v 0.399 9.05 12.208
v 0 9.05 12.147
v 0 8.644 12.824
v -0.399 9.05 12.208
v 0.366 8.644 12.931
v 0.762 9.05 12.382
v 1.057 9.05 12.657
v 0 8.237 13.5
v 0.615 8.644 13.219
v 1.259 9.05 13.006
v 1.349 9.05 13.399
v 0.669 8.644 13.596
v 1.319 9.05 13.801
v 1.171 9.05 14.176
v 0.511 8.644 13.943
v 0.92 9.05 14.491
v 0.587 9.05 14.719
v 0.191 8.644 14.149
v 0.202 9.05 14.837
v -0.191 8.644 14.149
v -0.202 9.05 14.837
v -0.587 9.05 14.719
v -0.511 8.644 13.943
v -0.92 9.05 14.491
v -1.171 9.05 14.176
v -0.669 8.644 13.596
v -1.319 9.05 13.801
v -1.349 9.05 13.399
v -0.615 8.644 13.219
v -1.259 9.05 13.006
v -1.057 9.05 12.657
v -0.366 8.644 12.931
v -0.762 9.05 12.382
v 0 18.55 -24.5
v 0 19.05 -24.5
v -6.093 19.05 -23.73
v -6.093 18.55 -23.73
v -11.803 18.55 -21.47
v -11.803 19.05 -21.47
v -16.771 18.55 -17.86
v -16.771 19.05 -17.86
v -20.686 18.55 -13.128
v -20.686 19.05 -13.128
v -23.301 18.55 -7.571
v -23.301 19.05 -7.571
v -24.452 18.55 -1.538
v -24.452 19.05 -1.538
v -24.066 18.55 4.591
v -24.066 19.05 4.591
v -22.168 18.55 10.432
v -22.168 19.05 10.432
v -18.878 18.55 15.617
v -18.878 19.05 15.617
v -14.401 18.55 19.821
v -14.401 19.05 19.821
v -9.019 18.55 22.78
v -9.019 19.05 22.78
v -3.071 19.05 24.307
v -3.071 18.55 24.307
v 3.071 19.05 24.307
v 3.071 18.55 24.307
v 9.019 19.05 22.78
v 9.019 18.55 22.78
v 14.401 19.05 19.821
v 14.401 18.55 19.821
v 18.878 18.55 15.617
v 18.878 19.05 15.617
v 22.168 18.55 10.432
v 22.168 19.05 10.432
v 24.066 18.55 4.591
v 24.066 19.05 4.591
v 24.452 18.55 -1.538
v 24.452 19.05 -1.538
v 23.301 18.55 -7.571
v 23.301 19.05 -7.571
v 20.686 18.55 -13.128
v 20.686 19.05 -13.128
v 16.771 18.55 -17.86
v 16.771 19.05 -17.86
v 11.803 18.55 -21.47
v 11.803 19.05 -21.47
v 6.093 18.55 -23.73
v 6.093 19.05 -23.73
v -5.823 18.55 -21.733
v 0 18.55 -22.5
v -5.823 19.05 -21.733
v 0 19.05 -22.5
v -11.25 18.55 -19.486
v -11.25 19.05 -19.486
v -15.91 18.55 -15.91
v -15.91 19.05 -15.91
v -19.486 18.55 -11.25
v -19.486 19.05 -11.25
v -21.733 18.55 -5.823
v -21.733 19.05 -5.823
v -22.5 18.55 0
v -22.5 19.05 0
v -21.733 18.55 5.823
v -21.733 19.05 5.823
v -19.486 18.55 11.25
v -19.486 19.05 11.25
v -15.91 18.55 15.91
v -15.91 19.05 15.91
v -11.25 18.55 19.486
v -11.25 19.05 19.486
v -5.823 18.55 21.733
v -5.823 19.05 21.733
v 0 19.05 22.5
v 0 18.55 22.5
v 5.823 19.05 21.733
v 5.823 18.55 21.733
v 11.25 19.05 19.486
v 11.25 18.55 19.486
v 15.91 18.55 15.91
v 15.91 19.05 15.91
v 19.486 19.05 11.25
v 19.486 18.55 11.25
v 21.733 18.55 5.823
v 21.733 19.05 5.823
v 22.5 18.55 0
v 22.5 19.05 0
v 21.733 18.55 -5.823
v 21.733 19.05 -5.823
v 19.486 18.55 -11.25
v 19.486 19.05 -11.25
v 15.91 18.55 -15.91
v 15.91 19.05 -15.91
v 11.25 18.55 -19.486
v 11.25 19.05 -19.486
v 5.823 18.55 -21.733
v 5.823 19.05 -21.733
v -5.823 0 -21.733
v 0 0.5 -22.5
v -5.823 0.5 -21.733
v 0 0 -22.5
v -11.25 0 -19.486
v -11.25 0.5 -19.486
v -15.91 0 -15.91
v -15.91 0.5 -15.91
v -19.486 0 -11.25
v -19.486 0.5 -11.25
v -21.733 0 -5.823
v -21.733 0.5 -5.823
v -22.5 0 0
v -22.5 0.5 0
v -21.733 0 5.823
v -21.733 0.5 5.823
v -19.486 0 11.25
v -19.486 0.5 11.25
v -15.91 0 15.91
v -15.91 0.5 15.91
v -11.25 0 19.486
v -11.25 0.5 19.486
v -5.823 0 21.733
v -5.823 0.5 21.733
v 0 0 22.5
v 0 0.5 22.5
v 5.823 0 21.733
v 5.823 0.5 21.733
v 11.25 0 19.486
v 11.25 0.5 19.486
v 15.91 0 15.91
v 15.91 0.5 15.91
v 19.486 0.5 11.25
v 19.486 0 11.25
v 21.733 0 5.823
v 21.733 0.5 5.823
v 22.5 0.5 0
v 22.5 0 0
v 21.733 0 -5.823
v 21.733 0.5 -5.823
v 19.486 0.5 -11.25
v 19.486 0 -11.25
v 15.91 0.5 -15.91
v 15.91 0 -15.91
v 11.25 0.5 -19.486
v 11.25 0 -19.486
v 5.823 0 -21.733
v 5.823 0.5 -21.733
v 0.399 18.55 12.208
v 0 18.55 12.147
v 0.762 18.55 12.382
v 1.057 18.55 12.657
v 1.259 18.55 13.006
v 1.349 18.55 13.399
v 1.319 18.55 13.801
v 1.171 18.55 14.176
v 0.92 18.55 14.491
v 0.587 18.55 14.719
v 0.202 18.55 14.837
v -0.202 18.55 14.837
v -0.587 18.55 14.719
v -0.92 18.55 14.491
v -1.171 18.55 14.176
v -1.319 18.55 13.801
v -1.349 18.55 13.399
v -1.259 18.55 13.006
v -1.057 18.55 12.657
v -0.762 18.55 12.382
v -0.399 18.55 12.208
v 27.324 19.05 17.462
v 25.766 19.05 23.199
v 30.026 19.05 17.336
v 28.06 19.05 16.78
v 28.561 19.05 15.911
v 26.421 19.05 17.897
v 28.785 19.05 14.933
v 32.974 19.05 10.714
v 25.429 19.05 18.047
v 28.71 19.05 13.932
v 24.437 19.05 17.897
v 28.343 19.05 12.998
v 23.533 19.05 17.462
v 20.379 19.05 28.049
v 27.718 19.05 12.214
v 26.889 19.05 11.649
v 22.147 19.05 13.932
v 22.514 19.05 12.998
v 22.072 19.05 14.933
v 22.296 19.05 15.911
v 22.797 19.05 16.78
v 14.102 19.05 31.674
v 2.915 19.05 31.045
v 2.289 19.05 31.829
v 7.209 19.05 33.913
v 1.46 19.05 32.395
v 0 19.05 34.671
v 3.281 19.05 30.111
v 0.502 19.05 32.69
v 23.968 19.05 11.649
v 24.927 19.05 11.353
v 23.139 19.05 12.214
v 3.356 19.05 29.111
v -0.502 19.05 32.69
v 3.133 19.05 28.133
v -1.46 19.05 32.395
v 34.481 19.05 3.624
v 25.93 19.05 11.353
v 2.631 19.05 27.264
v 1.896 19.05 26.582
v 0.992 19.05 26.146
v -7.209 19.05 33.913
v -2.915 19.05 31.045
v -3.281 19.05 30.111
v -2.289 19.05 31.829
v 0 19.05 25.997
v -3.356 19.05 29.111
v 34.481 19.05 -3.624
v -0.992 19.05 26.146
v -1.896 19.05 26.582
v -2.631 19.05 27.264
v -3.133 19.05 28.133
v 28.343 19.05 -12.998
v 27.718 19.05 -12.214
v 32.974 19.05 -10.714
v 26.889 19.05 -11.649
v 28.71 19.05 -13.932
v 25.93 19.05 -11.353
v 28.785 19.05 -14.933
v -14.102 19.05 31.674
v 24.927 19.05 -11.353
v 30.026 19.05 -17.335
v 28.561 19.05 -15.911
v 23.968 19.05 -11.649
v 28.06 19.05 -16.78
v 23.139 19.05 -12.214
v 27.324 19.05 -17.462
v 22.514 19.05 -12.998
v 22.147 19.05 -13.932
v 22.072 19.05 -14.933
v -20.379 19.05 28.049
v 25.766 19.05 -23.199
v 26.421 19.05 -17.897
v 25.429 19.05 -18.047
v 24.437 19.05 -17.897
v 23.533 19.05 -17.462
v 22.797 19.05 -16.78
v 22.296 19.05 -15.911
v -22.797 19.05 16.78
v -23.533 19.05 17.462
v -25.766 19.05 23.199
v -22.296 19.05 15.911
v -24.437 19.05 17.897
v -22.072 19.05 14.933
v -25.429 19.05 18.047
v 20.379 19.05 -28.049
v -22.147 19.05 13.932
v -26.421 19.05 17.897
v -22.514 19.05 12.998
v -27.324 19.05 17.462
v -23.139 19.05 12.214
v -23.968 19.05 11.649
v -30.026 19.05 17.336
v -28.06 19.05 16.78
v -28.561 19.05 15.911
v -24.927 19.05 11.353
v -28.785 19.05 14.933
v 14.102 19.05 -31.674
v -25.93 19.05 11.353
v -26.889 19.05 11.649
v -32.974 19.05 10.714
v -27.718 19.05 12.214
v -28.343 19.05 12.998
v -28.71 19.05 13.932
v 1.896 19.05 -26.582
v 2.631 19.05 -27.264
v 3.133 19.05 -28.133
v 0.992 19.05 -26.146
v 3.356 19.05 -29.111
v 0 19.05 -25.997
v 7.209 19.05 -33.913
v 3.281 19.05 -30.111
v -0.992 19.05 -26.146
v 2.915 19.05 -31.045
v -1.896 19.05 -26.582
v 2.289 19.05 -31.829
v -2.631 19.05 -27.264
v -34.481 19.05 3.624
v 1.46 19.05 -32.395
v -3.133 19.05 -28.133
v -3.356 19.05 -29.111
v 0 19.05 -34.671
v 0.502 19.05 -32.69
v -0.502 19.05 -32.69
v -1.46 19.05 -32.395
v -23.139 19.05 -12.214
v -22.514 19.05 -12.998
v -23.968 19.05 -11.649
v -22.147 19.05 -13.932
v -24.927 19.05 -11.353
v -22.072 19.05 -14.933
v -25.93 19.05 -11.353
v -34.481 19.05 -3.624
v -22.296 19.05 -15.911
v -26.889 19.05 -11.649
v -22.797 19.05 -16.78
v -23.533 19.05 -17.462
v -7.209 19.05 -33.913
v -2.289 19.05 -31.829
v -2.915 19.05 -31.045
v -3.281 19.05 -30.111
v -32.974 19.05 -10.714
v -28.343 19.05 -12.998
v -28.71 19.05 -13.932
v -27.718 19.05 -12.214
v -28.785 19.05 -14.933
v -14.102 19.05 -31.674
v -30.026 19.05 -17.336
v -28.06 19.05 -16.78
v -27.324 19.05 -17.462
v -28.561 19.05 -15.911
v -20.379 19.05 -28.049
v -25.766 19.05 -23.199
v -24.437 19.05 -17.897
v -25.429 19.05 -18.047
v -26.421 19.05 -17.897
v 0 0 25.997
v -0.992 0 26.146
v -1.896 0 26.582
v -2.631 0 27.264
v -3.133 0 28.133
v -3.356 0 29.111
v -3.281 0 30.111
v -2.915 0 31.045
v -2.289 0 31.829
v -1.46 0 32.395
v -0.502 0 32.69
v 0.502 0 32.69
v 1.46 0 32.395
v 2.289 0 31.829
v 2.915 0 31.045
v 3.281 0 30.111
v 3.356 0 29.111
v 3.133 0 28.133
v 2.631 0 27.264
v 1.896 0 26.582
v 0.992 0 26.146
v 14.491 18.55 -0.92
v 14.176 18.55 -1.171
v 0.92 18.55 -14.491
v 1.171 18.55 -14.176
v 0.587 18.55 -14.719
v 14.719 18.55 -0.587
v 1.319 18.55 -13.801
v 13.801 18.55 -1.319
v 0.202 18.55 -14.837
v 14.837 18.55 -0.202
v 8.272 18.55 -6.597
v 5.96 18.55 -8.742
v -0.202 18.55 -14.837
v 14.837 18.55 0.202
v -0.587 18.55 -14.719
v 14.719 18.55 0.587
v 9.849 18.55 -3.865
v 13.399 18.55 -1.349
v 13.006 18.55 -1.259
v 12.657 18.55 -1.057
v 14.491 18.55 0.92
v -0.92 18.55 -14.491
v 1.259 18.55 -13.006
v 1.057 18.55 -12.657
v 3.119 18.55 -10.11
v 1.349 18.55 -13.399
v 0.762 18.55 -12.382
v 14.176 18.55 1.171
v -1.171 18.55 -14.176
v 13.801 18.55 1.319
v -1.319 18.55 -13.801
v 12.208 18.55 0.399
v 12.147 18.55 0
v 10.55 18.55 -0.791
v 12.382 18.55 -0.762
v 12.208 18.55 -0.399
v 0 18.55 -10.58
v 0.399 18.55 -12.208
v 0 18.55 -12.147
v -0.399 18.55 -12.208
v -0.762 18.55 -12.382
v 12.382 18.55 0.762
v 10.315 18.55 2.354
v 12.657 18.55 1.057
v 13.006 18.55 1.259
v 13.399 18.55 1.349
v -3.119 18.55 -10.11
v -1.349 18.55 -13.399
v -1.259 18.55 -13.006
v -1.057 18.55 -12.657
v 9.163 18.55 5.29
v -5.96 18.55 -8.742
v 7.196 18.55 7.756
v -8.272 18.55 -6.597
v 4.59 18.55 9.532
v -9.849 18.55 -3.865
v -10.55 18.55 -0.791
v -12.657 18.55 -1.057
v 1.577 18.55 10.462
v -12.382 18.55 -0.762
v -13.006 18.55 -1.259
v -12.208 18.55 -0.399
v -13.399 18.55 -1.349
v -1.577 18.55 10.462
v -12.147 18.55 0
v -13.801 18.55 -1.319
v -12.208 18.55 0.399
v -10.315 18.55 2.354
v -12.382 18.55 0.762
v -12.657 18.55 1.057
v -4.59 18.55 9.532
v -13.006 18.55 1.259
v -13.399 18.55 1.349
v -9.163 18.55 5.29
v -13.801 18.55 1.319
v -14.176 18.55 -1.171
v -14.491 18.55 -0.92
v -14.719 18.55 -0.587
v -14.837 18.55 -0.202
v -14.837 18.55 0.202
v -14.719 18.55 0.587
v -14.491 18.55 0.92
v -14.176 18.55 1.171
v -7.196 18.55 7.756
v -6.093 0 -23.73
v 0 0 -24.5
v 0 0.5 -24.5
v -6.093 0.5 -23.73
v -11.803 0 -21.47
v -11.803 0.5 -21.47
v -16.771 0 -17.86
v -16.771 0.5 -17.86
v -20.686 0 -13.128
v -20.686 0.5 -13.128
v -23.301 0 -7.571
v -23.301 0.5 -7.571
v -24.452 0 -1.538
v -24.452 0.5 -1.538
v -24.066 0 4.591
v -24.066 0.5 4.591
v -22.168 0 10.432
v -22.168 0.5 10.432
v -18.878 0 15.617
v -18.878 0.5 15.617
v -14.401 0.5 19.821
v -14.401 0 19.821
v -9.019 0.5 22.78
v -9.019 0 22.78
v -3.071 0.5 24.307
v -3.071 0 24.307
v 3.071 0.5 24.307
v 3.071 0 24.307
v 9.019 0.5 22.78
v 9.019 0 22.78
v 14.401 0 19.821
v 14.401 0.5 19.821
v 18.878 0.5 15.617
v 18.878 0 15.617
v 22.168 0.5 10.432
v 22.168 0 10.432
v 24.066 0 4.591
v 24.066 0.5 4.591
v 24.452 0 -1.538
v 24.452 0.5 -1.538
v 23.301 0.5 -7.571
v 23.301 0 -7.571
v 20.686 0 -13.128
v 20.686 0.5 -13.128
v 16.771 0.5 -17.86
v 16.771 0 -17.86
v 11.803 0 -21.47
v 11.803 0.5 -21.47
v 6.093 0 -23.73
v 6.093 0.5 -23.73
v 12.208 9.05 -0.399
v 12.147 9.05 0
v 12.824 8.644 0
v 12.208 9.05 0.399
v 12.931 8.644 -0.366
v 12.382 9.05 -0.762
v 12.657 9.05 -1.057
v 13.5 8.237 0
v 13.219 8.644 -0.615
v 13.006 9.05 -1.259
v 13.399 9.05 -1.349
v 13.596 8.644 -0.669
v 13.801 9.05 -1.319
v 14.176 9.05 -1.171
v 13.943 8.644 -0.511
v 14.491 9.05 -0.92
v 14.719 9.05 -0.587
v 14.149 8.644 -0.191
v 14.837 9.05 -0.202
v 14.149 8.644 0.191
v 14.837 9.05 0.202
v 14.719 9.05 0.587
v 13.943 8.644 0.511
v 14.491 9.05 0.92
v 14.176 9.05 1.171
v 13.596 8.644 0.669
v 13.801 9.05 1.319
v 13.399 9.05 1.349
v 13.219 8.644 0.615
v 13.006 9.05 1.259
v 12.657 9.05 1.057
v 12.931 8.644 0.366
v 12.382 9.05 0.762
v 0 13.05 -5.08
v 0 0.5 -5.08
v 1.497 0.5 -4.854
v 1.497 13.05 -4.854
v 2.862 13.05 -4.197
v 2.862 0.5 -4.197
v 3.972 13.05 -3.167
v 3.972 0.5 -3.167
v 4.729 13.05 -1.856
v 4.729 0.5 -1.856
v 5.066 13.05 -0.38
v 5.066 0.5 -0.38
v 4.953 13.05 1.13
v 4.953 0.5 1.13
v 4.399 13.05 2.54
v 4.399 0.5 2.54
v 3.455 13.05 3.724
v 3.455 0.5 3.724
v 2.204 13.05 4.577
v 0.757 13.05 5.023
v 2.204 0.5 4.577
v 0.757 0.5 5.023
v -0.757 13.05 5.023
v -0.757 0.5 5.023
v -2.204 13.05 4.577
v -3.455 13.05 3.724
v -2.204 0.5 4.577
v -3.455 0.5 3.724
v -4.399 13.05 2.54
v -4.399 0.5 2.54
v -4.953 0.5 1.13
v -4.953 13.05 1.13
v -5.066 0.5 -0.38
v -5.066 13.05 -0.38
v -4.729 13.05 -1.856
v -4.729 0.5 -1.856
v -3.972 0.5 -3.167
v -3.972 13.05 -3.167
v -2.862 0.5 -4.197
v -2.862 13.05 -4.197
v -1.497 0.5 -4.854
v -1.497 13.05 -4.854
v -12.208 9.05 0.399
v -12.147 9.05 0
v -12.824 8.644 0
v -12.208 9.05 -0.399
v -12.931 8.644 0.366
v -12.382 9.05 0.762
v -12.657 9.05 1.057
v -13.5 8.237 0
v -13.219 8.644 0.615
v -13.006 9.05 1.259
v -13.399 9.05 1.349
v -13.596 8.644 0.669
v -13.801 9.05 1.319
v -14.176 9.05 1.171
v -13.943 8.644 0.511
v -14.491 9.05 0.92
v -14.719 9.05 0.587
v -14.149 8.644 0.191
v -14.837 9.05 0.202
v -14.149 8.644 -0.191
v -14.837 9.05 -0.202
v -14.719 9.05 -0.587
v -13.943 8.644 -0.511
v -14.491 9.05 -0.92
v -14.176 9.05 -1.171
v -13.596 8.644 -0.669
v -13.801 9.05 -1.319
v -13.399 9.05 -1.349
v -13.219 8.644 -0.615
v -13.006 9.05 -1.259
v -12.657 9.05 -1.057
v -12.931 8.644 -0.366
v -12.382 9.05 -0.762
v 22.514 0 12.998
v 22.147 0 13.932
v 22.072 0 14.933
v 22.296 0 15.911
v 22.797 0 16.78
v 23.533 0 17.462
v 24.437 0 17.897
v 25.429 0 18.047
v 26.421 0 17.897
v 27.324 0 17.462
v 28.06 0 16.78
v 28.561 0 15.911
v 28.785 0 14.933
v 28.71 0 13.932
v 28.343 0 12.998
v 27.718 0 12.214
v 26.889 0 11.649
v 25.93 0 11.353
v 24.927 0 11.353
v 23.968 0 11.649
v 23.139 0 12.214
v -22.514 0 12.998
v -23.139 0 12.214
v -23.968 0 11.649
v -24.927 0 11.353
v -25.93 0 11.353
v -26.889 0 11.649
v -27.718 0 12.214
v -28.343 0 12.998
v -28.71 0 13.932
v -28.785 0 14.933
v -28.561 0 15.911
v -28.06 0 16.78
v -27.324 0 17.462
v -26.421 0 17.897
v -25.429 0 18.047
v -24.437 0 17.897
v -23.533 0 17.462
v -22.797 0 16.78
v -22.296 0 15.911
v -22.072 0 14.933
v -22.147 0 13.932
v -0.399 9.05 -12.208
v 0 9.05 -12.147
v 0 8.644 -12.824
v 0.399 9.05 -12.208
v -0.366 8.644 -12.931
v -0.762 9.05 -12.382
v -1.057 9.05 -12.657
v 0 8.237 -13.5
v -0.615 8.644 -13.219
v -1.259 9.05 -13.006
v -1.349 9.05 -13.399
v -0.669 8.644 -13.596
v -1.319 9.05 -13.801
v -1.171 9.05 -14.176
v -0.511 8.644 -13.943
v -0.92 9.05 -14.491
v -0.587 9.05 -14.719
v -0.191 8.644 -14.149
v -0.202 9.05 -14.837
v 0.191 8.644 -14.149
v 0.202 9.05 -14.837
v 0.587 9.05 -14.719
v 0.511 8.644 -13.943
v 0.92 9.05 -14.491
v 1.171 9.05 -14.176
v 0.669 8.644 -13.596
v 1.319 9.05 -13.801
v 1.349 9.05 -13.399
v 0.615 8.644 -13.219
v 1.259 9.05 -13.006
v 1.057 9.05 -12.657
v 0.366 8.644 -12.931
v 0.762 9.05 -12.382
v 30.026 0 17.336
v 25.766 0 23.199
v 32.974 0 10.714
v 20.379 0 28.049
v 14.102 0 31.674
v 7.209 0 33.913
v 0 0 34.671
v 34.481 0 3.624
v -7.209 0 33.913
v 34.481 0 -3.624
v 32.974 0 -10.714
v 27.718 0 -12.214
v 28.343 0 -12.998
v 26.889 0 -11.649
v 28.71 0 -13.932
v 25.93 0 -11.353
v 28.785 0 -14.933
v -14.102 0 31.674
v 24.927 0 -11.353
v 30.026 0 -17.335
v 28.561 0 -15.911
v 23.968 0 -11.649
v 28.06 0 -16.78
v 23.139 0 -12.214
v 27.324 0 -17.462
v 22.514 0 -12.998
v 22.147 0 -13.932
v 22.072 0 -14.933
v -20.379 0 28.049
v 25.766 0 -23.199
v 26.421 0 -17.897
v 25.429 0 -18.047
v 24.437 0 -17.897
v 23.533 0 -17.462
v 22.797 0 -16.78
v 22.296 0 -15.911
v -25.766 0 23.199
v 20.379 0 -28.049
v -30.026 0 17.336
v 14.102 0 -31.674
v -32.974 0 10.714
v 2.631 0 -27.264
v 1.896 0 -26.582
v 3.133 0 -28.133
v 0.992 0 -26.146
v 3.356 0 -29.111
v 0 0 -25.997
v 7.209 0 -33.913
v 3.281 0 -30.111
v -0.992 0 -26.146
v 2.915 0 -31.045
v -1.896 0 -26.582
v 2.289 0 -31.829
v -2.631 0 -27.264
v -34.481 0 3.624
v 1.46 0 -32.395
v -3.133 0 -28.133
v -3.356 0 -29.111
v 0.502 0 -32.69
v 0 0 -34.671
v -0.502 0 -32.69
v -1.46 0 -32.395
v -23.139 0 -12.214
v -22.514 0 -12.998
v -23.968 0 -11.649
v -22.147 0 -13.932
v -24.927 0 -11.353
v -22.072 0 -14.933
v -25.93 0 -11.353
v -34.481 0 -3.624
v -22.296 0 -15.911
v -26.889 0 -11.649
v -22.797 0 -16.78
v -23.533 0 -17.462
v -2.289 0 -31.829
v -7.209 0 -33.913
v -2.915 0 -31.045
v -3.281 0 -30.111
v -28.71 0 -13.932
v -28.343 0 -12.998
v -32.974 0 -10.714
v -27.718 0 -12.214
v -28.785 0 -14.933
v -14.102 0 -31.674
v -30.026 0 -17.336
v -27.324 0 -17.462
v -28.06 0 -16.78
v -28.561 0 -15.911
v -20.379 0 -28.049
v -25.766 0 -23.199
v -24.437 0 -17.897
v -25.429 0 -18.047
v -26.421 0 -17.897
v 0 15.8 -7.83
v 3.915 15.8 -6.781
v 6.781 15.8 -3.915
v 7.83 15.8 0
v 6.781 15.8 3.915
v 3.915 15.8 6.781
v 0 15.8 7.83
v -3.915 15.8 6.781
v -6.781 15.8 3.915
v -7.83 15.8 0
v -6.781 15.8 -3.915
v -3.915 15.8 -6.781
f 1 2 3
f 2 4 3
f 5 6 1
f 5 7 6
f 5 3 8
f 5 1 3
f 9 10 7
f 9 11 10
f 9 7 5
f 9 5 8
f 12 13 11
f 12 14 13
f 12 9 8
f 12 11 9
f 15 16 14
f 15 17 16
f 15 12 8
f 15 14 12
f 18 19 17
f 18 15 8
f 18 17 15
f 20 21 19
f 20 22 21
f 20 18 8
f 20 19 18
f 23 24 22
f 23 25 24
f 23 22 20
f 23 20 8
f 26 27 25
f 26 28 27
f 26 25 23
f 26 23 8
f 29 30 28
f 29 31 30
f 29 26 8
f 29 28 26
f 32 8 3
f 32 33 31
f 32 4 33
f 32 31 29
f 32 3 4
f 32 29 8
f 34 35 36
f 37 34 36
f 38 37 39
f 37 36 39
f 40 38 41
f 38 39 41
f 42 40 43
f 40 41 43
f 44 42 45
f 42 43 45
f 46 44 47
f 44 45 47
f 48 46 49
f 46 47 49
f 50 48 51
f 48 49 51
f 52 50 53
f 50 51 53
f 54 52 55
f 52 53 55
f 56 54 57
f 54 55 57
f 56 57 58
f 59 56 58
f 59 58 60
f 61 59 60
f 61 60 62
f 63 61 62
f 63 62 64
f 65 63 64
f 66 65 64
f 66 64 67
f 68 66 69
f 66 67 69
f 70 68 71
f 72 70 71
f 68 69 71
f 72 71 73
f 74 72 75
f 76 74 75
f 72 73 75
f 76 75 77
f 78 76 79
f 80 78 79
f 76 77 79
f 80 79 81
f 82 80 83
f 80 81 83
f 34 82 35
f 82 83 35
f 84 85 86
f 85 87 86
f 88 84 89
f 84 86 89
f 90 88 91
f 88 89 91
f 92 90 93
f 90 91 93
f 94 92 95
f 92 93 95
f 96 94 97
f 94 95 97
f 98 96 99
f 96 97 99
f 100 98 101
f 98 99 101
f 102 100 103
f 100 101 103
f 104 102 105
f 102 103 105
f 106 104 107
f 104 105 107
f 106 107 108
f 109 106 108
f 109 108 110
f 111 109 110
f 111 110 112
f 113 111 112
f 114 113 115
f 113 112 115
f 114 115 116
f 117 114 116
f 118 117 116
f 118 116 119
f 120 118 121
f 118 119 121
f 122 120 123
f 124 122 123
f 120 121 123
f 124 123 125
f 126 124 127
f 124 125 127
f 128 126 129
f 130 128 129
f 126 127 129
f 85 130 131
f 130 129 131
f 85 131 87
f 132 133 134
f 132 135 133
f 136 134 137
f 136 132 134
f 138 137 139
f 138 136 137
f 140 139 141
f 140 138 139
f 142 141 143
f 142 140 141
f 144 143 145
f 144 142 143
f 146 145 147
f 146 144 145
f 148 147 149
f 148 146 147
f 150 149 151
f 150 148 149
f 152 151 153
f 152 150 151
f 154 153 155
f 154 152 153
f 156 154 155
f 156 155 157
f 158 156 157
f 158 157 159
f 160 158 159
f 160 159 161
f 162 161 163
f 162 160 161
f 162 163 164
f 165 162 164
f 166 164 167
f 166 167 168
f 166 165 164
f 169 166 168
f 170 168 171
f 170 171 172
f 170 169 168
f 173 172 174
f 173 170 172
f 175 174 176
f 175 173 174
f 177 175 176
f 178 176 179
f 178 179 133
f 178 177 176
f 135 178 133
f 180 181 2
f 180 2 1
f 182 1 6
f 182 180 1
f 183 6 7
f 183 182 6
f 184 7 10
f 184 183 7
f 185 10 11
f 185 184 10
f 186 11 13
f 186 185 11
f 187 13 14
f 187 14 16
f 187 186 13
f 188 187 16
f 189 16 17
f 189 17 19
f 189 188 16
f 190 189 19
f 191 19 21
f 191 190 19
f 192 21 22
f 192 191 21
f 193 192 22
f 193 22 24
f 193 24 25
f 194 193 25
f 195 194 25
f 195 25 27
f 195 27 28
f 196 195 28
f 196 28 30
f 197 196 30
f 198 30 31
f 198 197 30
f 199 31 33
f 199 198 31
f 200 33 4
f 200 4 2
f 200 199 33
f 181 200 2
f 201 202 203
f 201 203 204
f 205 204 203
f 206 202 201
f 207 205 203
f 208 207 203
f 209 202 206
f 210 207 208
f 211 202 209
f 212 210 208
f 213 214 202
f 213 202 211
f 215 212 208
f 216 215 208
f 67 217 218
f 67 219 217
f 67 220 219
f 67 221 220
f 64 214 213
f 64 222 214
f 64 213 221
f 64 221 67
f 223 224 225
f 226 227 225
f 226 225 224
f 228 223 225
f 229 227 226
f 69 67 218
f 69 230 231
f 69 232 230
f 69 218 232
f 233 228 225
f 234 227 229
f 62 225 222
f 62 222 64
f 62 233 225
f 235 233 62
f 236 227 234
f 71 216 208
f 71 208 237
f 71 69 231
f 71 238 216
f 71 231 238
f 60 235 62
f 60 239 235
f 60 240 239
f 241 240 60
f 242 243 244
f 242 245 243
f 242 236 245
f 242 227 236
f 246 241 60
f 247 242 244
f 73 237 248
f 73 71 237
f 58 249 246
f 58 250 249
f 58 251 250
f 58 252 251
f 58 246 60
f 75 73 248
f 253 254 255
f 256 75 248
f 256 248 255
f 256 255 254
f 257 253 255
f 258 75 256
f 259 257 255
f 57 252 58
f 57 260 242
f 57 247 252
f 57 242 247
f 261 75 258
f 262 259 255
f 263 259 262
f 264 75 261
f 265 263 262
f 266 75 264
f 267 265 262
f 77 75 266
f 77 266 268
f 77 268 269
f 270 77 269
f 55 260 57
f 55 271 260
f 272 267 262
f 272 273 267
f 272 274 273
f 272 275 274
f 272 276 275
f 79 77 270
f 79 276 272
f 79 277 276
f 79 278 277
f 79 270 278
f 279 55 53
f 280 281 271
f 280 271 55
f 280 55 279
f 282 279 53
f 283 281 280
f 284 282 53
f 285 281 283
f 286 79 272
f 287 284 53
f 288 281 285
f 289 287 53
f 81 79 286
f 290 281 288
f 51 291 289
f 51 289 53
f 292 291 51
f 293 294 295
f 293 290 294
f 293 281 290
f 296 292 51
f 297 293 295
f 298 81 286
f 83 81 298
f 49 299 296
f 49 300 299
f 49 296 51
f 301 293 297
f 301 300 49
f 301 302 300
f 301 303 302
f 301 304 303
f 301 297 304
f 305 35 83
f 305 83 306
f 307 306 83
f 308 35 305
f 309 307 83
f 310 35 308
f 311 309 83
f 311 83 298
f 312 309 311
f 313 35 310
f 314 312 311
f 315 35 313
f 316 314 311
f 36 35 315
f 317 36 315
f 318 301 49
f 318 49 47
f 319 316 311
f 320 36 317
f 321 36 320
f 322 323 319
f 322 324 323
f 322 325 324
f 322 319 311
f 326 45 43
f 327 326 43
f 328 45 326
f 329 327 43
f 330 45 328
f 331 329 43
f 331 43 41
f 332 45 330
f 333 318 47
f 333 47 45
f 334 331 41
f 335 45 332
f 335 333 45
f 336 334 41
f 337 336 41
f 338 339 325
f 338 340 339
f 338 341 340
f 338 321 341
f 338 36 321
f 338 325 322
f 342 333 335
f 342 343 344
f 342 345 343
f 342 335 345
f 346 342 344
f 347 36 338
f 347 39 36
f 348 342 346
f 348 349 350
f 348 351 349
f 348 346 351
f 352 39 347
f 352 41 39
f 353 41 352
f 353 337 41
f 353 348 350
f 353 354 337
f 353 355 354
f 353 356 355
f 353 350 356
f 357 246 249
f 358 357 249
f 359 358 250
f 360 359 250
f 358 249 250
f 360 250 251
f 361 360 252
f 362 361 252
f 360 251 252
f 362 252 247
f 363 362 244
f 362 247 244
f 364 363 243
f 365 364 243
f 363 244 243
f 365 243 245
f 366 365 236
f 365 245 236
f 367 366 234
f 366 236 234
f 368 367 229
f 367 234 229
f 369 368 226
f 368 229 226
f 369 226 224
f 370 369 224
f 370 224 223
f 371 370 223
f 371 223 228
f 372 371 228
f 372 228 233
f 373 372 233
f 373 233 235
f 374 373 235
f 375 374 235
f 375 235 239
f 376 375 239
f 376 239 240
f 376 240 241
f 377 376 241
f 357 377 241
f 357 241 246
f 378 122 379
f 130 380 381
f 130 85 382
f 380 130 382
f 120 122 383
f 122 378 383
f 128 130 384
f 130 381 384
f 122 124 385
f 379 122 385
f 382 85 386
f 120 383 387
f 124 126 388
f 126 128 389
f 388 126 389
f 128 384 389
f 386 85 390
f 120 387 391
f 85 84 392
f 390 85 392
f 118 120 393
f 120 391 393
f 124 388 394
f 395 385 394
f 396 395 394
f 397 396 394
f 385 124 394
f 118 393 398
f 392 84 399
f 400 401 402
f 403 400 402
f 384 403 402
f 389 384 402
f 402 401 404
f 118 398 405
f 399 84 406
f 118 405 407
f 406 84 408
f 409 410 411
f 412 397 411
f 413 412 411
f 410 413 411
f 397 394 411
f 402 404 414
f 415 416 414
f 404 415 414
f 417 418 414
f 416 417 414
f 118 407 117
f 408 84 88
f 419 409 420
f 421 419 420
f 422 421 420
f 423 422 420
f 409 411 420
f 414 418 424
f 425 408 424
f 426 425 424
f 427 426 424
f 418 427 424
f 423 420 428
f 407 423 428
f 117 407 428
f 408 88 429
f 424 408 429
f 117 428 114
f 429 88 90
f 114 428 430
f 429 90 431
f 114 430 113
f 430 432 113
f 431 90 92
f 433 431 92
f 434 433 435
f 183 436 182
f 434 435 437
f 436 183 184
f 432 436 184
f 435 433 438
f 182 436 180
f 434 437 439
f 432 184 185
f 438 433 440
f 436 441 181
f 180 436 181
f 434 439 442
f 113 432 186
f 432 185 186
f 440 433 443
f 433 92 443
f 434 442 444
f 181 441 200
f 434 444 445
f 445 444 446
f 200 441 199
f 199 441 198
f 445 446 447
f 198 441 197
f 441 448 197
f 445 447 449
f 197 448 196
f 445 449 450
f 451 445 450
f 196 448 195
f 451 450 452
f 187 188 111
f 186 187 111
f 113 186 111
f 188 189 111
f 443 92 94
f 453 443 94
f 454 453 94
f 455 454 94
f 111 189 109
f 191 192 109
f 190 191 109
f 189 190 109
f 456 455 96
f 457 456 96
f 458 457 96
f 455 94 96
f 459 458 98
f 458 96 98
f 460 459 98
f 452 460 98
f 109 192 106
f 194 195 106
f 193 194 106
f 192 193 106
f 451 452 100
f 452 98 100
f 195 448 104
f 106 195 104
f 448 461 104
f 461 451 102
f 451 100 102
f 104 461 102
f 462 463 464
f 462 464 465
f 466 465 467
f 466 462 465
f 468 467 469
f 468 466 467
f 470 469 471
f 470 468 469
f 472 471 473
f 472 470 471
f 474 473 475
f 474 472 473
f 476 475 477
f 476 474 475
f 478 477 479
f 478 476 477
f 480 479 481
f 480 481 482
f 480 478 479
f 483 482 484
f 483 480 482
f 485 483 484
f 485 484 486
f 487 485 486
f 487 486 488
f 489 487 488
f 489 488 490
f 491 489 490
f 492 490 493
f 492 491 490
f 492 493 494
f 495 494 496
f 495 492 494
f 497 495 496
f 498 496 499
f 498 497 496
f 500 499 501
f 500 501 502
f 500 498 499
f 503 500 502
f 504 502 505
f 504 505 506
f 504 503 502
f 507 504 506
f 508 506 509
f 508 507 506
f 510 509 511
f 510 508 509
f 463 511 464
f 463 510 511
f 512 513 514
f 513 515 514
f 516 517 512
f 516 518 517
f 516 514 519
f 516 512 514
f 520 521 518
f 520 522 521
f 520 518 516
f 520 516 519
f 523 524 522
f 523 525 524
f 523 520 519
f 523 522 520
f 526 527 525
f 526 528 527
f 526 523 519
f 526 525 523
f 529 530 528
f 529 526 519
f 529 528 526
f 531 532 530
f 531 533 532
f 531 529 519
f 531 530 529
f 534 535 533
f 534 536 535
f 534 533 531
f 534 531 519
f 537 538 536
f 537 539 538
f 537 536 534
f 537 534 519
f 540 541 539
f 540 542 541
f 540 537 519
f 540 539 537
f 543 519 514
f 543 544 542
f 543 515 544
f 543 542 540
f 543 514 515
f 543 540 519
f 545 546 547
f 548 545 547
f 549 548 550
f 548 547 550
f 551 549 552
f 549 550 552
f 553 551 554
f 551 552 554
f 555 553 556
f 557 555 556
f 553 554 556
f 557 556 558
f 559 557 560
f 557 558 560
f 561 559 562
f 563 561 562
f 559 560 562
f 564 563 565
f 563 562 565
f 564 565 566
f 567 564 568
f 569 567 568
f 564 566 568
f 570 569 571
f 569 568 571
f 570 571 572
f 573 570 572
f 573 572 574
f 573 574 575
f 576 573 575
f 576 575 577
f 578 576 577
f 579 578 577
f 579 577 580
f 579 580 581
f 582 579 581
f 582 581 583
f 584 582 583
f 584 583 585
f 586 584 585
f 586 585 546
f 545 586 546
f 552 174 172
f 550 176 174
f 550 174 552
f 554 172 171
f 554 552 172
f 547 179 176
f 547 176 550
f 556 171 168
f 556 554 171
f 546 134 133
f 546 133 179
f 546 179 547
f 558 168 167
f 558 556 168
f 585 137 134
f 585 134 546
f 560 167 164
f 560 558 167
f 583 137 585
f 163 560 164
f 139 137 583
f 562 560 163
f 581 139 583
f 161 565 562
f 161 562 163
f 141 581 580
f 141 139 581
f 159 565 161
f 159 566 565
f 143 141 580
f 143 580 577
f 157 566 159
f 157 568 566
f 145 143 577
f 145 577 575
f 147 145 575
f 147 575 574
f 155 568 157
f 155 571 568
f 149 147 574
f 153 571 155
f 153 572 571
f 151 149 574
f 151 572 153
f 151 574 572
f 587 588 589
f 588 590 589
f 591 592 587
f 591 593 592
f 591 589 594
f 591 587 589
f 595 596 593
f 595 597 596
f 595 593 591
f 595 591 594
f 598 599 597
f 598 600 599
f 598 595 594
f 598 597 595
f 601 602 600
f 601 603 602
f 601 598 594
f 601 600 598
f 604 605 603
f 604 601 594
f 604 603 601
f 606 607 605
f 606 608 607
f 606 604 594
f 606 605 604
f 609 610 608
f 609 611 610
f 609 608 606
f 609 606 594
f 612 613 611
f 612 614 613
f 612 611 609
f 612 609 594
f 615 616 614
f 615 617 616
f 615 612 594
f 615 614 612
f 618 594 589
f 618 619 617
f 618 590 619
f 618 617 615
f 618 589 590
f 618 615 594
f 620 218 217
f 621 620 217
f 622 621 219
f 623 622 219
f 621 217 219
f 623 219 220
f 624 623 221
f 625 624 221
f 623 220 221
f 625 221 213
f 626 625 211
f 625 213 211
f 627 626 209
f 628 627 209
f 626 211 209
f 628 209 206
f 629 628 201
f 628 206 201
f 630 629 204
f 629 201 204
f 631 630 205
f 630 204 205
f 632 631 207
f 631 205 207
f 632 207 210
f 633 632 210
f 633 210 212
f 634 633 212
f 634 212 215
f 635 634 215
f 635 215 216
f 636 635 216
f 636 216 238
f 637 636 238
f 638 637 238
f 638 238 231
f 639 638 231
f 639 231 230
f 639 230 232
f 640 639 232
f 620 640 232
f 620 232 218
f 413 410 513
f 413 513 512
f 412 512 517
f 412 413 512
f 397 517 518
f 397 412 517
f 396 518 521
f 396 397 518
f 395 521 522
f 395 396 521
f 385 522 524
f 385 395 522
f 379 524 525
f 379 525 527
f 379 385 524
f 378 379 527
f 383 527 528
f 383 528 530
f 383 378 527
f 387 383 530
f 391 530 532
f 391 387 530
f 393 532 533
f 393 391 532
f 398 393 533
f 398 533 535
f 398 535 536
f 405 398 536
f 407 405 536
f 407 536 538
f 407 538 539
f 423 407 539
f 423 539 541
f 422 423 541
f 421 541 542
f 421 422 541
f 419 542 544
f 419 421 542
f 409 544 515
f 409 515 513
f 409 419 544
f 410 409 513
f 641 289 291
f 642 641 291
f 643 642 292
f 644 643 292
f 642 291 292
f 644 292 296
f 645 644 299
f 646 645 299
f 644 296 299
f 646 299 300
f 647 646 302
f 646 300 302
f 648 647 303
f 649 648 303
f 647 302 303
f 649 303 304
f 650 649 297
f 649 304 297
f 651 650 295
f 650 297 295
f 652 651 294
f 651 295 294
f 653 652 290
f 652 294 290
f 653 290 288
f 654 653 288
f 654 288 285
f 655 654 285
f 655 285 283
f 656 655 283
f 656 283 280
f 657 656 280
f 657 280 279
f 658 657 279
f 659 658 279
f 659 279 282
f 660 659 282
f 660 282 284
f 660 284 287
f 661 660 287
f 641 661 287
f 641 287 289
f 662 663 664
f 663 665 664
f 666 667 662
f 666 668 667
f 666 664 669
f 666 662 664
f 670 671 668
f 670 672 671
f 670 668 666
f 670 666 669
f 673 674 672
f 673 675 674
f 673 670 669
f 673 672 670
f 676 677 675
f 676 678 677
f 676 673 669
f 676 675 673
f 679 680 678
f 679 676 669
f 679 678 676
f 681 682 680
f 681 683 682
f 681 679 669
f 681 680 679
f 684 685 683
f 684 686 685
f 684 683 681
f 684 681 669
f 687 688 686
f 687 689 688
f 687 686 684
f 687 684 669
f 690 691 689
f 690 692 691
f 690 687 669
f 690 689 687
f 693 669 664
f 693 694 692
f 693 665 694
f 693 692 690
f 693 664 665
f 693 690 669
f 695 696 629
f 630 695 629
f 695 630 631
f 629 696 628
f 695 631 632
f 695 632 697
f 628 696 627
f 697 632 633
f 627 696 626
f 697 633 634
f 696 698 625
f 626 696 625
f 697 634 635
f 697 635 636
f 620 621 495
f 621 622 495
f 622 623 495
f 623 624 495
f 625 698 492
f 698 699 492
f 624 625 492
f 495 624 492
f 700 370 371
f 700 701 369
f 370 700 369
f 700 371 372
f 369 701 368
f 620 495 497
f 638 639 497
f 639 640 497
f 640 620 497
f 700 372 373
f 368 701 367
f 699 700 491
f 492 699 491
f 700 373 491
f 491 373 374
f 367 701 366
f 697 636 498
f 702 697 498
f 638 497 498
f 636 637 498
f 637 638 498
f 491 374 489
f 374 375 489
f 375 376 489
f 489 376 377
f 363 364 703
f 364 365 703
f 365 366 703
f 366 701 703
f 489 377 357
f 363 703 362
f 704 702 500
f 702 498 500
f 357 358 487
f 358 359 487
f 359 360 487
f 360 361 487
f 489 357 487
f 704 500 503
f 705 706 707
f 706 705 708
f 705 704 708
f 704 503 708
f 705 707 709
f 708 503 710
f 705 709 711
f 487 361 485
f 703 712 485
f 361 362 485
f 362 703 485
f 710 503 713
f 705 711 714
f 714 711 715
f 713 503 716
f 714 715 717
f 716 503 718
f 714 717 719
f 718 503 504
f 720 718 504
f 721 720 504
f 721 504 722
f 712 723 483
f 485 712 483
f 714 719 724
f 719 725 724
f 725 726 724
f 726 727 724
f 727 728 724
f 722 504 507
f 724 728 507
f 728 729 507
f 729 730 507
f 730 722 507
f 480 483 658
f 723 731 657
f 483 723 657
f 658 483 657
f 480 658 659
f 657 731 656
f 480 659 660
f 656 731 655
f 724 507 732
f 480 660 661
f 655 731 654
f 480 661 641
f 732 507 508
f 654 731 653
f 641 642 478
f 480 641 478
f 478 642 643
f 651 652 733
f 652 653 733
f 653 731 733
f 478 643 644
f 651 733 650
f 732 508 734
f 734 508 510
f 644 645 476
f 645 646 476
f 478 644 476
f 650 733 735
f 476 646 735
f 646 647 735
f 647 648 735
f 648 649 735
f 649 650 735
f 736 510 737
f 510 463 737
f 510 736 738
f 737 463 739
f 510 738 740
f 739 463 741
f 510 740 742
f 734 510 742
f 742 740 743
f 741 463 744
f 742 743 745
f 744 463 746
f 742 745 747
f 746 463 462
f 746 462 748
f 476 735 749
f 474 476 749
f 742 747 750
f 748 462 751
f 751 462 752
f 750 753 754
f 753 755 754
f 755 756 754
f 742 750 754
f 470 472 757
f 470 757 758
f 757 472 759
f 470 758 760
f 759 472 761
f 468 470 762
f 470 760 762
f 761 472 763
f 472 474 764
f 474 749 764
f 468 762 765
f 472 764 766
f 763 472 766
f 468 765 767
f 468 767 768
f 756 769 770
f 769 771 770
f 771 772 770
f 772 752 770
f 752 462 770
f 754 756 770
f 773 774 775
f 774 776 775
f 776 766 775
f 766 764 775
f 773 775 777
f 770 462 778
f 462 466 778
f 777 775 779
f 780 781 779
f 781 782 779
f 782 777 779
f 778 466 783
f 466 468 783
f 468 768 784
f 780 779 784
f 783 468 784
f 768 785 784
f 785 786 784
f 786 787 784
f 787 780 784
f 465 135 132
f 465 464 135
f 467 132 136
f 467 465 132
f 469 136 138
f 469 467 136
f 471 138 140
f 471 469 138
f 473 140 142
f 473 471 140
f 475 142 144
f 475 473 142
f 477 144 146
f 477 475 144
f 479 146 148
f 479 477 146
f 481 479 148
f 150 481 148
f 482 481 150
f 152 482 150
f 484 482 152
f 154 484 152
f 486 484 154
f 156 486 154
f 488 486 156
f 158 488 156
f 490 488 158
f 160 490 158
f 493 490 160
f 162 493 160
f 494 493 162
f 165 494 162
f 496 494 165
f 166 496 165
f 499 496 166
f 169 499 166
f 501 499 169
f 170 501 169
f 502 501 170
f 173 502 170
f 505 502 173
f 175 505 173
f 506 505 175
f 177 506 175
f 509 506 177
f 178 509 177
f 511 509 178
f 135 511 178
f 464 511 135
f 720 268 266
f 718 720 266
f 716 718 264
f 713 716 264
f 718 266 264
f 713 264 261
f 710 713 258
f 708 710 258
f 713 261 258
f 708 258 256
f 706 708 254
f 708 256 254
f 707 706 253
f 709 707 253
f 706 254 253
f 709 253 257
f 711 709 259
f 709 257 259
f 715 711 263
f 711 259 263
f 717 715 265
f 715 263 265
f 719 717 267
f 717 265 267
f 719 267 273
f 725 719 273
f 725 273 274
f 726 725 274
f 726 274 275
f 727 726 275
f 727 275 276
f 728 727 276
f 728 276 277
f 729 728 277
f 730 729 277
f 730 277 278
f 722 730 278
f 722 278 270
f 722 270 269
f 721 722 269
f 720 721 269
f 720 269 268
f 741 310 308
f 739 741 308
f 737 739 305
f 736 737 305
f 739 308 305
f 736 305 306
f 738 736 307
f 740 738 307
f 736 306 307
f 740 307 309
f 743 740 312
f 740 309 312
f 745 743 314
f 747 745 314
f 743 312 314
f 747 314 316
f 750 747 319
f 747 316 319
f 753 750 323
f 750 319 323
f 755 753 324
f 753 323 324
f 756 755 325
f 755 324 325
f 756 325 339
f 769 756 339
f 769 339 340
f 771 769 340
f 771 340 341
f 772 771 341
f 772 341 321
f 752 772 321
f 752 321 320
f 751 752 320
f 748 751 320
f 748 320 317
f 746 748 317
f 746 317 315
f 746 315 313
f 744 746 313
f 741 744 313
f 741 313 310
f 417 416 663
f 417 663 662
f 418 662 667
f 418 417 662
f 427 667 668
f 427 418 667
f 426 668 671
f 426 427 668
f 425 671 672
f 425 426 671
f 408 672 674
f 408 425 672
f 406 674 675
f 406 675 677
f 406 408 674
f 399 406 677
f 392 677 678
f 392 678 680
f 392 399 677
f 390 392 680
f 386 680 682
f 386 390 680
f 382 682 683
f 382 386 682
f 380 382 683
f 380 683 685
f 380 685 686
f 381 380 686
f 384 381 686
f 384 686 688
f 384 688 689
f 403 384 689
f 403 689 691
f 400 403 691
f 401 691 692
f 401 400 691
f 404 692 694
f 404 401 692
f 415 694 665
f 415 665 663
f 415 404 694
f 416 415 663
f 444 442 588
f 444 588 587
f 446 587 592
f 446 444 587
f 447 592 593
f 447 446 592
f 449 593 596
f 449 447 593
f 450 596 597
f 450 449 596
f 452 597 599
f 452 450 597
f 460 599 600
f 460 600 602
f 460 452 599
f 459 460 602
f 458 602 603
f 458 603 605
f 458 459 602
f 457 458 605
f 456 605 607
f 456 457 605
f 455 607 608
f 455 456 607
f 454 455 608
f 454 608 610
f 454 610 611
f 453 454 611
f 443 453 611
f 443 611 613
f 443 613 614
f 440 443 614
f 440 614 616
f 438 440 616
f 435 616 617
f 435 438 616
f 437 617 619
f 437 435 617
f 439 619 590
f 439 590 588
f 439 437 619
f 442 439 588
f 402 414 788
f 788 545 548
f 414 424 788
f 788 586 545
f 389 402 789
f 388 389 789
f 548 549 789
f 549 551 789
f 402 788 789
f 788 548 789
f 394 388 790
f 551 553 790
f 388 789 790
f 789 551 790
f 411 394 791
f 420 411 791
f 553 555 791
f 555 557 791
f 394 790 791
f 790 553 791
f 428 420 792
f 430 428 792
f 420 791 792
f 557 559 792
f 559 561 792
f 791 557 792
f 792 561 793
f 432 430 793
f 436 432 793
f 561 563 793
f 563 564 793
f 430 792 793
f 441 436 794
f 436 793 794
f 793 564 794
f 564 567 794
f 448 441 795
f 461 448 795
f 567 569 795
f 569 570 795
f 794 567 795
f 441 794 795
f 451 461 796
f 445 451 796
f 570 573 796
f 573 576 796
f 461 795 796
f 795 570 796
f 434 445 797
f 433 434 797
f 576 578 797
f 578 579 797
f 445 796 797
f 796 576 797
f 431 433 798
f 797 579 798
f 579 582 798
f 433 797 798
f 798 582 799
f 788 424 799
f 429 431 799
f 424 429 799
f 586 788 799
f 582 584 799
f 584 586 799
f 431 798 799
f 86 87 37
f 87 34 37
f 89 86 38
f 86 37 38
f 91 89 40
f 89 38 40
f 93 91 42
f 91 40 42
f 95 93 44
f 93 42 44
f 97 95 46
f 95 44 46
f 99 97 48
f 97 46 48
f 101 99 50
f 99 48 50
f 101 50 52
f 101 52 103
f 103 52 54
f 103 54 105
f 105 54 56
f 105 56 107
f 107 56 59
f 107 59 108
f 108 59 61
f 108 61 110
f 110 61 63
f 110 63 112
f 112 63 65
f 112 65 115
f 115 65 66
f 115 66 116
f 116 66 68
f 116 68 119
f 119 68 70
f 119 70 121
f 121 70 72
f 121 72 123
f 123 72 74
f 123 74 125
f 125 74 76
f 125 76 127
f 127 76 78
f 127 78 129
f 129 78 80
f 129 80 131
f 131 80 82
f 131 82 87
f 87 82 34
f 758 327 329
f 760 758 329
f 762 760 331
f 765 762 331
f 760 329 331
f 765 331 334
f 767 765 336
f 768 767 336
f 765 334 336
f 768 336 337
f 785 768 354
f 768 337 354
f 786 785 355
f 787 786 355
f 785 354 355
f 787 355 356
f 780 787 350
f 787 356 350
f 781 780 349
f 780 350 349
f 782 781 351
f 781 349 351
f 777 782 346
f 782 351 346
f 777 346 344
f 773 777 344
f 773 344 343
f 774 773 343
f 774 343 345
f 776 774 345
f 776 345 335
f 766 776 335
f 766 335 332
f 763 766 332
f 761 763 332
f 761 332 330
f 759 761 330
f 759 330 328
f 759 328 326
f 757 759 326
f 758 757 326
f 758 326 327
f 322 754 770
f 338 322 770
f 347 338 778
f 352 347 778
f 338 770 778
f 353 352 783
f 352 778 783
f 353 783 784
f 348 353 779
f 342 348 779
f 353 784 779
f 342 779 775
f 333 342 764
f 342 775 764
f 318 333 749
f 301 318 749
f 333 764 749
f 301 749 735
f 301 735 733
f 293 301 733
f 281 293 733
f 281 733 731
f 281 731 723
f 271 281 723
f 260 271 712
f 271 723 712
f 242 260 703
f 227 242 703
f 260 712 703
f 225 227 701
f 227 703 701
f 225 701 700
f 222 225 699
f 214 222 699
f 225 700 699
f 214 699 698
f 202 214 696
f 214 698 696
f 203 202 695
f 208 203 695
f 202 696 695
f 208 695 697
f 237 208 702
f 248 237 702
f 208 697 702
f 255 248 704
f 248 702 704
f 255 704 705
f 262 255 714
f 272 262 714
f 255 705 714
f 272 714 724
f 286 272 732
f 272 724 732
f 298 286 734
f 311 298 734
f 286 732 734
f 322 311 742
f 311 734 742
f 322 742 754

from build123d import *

# Parameters (mm, degrees)
SKETCH1_R           = 34.671
BOSS_EXTRUDE1_DEPTH = 19.05
SKETCH5_R           = 5.08
CUT_EXTRUDE1_DEPTH  = 53.602841957
CHAMFER1_SIZE       = 6
CIRPATTERN1_COUNT   = 4
SKETCH8_R           = 3.3655
CUT_EXTRUDE2_DEPTH  = 53.602841957
CIRPATTERN2_COUNT   = 6


with BuildPart() as part:
    # Sketch1 → Boss-Extrude1 (new body)
    with BuildSketch(Plane(origin=(0, 0, 0), x_dir=(1, 0, 0), z_dir=(0, 1, 0))):
        with Locations(Location((0, 0, 0), (0, 0, 90))):
            Circle(SKETCH1_R)
    extrude(amount=BOSS_EXTRUDE1_DEPTH)

    # Sketch5 → Cut-Extrude1 (cut, through all)
    with BuildSketch(Plane.XZ):
        with Locations(Location((0, 0, 0), (0, 0, 270))):
            Circle(SKETCH5_R)
    extrude(amount=-CUT_EXTRUDE1_DEPTH, mode=Mode.SUBTRACT)

    # Chamfer1
    chamfer1_edges = [part.edges().sort_by_distance(p)[0] for p in [
        (0, 19.05, 5.08),
    ]]
    chamfer(chamfer1_edges, length=CHAMFER1_SIZE)

    # Sketch6 → #6-32 Tapped Hole1 (revolve, cut)
    with BuildSketch(Plane(origin=(0, 19.05, -13.5), x_dir=(0, 0, 1), z_dir=(1, 0, 0))):
        Polygon((0, 0), (0, 10.81269403), (1.35255, 10), (1.35255, 0), align=None)
    f_6_32_tapped_hole1 = revolve(axis=Axis((0, 25.4, -13.5), (0, -1, 0)), mode=Mode.SUBTRACT)

    # CirPattern1: #6-32 Tapped Hole1 ×4 about axis
    cirpattern1_axis = Axis((0, 0, 0), (0, 1, 0))
    for i in range(1, CIRPATTERN1_COUNT):
        add(f_6_32_tapped_hole1.rotate(cirpattern1_axis, i * 360 / CIRPATTERN1_COUNT), mode=Mode.SUBTRACT)

    # Sketch8 → Cut-Extrude2 (cut, through all)
    with BuildSketch(Plane(origin=(0, 19.05, 0), x_dir=(1, 0, 0), z_dir=(0, 1, 0))):
        with Locations(Location((0, 29.3624, 0), (0, 0, 270))):
            Circle(SKETCH8_R)
    cut_extrude2 = extrude(amount=-CUT_EXTRUDE2_DEPTH, mode=Mode.SUBTRACT)

    # CirPattern2: Cut-Extrude2 ×6 about axis
    cirpattern2_axis = Axis((0, 0, 0), (0, 1, 0))
    for i in range(1, CIRPATTERN2_COUNT):
        add(cut_extrude2.rotate(cirpattern2_axis, i * 360 / CIRPATTERN2_COUNT), mode=Mode.SUBTRACT)

    # Sketch9 → Cut-Revolve1 (revolve, cut)
    with BuildSketch(Plane.XY, mode=Mode.PRIVATE) as cut_revolve1_sk:
        Polygon((0, -2.570803014), (0, 0.5), (22.5, 0.5), (22.5, 0), (24.5, 0.5), (24.5, -7.98797561), (0, -7.98797561), align=None)
    cut_revolve1 = revolve(cut_revolve1_sk.sketch.rotate(Axis((0, -2.570803014, 0), (0, 1, 0)), 90), axis=Axis((0, -2.570803014, 0), (0, 1, 0)), mode=Mode.SUBTRACT)

    # Mirror1: Cut-Revolve1 across plane
    add(cut_revolve1.mirror(Plane(origin=(0, 9.525, 0), x_dir=(0, 0, 1), z_dir=(0, -1, 0))), mode=Mode.SUBTRACT)


solid = part.part
